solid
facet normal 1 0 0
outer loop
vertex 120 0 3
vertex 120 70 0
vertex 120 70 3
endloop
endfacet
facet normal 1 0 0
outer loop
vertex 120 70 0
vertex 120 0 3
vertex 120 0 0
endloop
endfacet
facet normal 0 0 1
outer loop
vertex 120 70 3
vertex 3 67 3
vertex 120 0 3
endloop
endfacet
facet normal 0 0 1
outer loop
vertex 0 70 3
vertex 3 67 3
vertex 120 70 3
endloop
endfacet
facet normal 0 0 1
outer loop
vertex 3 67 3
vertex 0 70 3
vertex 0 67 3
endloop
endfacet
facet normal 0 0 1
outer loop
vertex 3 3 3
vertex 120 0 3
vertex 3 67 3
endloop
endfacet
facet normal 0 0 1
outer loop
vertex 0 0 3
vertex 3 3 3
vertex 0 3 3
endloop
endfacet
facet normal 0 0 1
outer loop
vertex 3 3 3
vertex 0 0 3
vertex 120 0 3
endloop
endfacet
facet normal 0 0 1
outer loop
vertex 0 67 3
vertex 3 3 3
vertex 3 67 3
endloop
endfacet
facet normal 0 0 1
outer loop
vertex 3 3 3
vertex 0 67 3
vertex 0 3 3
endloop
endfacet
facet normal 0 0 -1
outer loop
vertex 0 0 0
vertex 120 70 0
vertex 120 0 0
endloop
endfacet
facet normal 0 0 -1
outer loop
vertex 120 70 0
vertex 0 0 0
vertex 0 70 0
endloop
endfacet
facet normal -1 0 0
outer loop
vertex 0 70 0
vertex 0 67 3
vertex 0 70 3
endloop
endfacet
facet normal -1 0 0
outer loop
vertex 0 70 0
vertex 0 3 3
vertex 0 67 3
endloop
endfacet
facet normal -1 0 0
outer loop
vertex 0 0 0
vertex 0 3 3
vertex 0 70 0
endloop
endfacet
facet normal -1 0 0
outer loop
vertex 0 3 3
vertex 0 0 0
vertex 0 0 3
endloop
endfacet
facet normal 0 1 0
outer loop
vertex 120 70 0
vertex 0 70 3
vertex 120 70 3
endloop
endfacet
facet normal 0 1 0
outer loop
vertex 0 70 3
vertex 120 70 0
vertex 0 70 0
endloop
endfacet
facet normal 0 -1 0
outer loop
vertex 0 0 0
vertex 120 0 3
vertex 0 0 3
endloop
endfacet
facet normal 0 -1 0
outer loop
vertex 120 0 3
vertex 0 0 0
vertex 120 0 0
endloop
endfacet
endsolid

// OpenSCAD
// Mini horizontal gel-electrophoresis buffer tank.
// Outer dimensions: 120 (X) x 70 (Y) x 40 (Z).
// Wall thickness: 3 mm. Floor thickness: 3 mm.
// Inner floor height: 3 mm.
// Raised platform: 60 mm long (X), full inner width (Y), top at Z=13.
// Electrode holes: 2 mm diameter, horizontal along X, at Y=0, Z=30.

$fn = 64;

// Outer dimensions
X_out = 120;
Y_out = 70;
Z_out = 40;

// Thicknesses
wall_t = 3;
floor_t = 3;

// Inner dimensions
X_in  = X_out - 2 * wall_t;
Y_in  = Y_out - 2 * wall_t;
Z_in  = Z_out - floor_t;

// Platform dimensions
plat_len = 60;
plat_w   = Y_in;
plat_top_z = 13;

// Electrode hole specs
hole_d = 2;
hole_y = 0;
hole_z = 30;

// Main tank body (hollow box)
// We build the outer shell and subtract the inner void.
// The void starts at the inner floor level (Z = floor_t).

difference() {
    // 1. Outer Shell
    // Bottom slab
    translate([0, 0, 0]) cube([X_out, Y_out, floor_t]);
    // Side walls (left and right)
    translate([0, 0, floor_t]) cube([X_out, wall_t, Z_out - floor_t]);
    translate([0, Y_out - wall_t, floor_t]) cube([X_out, wall_t, Z_out - floor_t]);
    // Front and back walls
    translate([wall_t, 0, floor_t]) cube([wall_t, Y_out, Z_out - floor_t]);
    translate([X_out - wall_t, 0, floor_t]) cube([wall_t, Y_out, Z_out - floor_t]);

    // 2. Inner Void (Subtract this to make it hollow)
    // The void is the space inside the walls, starting from the floor.
    translate([wall_t, wall_t, floor_t]) cube([X_in, Y_in, Z_in]);

    // 3. Raised Platform
    // Position: Centred in X, full width in Y, height from floor to plat_top_z.
    // Base Z = floor_t. Top Z = plat_top_z.
    translate([
        (X_out - plat_len) / 2, 
        wall_t, 
        floor_t
    ]) cube([plat_len, plat_w, plat_top_z - floor_t]);

    // 4. Electrode Holes
    // Horizontal holes along X axis.
    // Position: Y = hole_y, Z = hole_z.
    // Since the hole is horizontal along X, the cylinder axis is X.
    // We need to rotate the cylinder 90 deg around Y to point along X.
    for (side = [-1, 1]) {
        translate([
            0, 
            side * hole_y, 
            hole_z
        ]) rotate([0, 90, 0]) cylinder(h = X_out, d = hole_d);
    }
}
